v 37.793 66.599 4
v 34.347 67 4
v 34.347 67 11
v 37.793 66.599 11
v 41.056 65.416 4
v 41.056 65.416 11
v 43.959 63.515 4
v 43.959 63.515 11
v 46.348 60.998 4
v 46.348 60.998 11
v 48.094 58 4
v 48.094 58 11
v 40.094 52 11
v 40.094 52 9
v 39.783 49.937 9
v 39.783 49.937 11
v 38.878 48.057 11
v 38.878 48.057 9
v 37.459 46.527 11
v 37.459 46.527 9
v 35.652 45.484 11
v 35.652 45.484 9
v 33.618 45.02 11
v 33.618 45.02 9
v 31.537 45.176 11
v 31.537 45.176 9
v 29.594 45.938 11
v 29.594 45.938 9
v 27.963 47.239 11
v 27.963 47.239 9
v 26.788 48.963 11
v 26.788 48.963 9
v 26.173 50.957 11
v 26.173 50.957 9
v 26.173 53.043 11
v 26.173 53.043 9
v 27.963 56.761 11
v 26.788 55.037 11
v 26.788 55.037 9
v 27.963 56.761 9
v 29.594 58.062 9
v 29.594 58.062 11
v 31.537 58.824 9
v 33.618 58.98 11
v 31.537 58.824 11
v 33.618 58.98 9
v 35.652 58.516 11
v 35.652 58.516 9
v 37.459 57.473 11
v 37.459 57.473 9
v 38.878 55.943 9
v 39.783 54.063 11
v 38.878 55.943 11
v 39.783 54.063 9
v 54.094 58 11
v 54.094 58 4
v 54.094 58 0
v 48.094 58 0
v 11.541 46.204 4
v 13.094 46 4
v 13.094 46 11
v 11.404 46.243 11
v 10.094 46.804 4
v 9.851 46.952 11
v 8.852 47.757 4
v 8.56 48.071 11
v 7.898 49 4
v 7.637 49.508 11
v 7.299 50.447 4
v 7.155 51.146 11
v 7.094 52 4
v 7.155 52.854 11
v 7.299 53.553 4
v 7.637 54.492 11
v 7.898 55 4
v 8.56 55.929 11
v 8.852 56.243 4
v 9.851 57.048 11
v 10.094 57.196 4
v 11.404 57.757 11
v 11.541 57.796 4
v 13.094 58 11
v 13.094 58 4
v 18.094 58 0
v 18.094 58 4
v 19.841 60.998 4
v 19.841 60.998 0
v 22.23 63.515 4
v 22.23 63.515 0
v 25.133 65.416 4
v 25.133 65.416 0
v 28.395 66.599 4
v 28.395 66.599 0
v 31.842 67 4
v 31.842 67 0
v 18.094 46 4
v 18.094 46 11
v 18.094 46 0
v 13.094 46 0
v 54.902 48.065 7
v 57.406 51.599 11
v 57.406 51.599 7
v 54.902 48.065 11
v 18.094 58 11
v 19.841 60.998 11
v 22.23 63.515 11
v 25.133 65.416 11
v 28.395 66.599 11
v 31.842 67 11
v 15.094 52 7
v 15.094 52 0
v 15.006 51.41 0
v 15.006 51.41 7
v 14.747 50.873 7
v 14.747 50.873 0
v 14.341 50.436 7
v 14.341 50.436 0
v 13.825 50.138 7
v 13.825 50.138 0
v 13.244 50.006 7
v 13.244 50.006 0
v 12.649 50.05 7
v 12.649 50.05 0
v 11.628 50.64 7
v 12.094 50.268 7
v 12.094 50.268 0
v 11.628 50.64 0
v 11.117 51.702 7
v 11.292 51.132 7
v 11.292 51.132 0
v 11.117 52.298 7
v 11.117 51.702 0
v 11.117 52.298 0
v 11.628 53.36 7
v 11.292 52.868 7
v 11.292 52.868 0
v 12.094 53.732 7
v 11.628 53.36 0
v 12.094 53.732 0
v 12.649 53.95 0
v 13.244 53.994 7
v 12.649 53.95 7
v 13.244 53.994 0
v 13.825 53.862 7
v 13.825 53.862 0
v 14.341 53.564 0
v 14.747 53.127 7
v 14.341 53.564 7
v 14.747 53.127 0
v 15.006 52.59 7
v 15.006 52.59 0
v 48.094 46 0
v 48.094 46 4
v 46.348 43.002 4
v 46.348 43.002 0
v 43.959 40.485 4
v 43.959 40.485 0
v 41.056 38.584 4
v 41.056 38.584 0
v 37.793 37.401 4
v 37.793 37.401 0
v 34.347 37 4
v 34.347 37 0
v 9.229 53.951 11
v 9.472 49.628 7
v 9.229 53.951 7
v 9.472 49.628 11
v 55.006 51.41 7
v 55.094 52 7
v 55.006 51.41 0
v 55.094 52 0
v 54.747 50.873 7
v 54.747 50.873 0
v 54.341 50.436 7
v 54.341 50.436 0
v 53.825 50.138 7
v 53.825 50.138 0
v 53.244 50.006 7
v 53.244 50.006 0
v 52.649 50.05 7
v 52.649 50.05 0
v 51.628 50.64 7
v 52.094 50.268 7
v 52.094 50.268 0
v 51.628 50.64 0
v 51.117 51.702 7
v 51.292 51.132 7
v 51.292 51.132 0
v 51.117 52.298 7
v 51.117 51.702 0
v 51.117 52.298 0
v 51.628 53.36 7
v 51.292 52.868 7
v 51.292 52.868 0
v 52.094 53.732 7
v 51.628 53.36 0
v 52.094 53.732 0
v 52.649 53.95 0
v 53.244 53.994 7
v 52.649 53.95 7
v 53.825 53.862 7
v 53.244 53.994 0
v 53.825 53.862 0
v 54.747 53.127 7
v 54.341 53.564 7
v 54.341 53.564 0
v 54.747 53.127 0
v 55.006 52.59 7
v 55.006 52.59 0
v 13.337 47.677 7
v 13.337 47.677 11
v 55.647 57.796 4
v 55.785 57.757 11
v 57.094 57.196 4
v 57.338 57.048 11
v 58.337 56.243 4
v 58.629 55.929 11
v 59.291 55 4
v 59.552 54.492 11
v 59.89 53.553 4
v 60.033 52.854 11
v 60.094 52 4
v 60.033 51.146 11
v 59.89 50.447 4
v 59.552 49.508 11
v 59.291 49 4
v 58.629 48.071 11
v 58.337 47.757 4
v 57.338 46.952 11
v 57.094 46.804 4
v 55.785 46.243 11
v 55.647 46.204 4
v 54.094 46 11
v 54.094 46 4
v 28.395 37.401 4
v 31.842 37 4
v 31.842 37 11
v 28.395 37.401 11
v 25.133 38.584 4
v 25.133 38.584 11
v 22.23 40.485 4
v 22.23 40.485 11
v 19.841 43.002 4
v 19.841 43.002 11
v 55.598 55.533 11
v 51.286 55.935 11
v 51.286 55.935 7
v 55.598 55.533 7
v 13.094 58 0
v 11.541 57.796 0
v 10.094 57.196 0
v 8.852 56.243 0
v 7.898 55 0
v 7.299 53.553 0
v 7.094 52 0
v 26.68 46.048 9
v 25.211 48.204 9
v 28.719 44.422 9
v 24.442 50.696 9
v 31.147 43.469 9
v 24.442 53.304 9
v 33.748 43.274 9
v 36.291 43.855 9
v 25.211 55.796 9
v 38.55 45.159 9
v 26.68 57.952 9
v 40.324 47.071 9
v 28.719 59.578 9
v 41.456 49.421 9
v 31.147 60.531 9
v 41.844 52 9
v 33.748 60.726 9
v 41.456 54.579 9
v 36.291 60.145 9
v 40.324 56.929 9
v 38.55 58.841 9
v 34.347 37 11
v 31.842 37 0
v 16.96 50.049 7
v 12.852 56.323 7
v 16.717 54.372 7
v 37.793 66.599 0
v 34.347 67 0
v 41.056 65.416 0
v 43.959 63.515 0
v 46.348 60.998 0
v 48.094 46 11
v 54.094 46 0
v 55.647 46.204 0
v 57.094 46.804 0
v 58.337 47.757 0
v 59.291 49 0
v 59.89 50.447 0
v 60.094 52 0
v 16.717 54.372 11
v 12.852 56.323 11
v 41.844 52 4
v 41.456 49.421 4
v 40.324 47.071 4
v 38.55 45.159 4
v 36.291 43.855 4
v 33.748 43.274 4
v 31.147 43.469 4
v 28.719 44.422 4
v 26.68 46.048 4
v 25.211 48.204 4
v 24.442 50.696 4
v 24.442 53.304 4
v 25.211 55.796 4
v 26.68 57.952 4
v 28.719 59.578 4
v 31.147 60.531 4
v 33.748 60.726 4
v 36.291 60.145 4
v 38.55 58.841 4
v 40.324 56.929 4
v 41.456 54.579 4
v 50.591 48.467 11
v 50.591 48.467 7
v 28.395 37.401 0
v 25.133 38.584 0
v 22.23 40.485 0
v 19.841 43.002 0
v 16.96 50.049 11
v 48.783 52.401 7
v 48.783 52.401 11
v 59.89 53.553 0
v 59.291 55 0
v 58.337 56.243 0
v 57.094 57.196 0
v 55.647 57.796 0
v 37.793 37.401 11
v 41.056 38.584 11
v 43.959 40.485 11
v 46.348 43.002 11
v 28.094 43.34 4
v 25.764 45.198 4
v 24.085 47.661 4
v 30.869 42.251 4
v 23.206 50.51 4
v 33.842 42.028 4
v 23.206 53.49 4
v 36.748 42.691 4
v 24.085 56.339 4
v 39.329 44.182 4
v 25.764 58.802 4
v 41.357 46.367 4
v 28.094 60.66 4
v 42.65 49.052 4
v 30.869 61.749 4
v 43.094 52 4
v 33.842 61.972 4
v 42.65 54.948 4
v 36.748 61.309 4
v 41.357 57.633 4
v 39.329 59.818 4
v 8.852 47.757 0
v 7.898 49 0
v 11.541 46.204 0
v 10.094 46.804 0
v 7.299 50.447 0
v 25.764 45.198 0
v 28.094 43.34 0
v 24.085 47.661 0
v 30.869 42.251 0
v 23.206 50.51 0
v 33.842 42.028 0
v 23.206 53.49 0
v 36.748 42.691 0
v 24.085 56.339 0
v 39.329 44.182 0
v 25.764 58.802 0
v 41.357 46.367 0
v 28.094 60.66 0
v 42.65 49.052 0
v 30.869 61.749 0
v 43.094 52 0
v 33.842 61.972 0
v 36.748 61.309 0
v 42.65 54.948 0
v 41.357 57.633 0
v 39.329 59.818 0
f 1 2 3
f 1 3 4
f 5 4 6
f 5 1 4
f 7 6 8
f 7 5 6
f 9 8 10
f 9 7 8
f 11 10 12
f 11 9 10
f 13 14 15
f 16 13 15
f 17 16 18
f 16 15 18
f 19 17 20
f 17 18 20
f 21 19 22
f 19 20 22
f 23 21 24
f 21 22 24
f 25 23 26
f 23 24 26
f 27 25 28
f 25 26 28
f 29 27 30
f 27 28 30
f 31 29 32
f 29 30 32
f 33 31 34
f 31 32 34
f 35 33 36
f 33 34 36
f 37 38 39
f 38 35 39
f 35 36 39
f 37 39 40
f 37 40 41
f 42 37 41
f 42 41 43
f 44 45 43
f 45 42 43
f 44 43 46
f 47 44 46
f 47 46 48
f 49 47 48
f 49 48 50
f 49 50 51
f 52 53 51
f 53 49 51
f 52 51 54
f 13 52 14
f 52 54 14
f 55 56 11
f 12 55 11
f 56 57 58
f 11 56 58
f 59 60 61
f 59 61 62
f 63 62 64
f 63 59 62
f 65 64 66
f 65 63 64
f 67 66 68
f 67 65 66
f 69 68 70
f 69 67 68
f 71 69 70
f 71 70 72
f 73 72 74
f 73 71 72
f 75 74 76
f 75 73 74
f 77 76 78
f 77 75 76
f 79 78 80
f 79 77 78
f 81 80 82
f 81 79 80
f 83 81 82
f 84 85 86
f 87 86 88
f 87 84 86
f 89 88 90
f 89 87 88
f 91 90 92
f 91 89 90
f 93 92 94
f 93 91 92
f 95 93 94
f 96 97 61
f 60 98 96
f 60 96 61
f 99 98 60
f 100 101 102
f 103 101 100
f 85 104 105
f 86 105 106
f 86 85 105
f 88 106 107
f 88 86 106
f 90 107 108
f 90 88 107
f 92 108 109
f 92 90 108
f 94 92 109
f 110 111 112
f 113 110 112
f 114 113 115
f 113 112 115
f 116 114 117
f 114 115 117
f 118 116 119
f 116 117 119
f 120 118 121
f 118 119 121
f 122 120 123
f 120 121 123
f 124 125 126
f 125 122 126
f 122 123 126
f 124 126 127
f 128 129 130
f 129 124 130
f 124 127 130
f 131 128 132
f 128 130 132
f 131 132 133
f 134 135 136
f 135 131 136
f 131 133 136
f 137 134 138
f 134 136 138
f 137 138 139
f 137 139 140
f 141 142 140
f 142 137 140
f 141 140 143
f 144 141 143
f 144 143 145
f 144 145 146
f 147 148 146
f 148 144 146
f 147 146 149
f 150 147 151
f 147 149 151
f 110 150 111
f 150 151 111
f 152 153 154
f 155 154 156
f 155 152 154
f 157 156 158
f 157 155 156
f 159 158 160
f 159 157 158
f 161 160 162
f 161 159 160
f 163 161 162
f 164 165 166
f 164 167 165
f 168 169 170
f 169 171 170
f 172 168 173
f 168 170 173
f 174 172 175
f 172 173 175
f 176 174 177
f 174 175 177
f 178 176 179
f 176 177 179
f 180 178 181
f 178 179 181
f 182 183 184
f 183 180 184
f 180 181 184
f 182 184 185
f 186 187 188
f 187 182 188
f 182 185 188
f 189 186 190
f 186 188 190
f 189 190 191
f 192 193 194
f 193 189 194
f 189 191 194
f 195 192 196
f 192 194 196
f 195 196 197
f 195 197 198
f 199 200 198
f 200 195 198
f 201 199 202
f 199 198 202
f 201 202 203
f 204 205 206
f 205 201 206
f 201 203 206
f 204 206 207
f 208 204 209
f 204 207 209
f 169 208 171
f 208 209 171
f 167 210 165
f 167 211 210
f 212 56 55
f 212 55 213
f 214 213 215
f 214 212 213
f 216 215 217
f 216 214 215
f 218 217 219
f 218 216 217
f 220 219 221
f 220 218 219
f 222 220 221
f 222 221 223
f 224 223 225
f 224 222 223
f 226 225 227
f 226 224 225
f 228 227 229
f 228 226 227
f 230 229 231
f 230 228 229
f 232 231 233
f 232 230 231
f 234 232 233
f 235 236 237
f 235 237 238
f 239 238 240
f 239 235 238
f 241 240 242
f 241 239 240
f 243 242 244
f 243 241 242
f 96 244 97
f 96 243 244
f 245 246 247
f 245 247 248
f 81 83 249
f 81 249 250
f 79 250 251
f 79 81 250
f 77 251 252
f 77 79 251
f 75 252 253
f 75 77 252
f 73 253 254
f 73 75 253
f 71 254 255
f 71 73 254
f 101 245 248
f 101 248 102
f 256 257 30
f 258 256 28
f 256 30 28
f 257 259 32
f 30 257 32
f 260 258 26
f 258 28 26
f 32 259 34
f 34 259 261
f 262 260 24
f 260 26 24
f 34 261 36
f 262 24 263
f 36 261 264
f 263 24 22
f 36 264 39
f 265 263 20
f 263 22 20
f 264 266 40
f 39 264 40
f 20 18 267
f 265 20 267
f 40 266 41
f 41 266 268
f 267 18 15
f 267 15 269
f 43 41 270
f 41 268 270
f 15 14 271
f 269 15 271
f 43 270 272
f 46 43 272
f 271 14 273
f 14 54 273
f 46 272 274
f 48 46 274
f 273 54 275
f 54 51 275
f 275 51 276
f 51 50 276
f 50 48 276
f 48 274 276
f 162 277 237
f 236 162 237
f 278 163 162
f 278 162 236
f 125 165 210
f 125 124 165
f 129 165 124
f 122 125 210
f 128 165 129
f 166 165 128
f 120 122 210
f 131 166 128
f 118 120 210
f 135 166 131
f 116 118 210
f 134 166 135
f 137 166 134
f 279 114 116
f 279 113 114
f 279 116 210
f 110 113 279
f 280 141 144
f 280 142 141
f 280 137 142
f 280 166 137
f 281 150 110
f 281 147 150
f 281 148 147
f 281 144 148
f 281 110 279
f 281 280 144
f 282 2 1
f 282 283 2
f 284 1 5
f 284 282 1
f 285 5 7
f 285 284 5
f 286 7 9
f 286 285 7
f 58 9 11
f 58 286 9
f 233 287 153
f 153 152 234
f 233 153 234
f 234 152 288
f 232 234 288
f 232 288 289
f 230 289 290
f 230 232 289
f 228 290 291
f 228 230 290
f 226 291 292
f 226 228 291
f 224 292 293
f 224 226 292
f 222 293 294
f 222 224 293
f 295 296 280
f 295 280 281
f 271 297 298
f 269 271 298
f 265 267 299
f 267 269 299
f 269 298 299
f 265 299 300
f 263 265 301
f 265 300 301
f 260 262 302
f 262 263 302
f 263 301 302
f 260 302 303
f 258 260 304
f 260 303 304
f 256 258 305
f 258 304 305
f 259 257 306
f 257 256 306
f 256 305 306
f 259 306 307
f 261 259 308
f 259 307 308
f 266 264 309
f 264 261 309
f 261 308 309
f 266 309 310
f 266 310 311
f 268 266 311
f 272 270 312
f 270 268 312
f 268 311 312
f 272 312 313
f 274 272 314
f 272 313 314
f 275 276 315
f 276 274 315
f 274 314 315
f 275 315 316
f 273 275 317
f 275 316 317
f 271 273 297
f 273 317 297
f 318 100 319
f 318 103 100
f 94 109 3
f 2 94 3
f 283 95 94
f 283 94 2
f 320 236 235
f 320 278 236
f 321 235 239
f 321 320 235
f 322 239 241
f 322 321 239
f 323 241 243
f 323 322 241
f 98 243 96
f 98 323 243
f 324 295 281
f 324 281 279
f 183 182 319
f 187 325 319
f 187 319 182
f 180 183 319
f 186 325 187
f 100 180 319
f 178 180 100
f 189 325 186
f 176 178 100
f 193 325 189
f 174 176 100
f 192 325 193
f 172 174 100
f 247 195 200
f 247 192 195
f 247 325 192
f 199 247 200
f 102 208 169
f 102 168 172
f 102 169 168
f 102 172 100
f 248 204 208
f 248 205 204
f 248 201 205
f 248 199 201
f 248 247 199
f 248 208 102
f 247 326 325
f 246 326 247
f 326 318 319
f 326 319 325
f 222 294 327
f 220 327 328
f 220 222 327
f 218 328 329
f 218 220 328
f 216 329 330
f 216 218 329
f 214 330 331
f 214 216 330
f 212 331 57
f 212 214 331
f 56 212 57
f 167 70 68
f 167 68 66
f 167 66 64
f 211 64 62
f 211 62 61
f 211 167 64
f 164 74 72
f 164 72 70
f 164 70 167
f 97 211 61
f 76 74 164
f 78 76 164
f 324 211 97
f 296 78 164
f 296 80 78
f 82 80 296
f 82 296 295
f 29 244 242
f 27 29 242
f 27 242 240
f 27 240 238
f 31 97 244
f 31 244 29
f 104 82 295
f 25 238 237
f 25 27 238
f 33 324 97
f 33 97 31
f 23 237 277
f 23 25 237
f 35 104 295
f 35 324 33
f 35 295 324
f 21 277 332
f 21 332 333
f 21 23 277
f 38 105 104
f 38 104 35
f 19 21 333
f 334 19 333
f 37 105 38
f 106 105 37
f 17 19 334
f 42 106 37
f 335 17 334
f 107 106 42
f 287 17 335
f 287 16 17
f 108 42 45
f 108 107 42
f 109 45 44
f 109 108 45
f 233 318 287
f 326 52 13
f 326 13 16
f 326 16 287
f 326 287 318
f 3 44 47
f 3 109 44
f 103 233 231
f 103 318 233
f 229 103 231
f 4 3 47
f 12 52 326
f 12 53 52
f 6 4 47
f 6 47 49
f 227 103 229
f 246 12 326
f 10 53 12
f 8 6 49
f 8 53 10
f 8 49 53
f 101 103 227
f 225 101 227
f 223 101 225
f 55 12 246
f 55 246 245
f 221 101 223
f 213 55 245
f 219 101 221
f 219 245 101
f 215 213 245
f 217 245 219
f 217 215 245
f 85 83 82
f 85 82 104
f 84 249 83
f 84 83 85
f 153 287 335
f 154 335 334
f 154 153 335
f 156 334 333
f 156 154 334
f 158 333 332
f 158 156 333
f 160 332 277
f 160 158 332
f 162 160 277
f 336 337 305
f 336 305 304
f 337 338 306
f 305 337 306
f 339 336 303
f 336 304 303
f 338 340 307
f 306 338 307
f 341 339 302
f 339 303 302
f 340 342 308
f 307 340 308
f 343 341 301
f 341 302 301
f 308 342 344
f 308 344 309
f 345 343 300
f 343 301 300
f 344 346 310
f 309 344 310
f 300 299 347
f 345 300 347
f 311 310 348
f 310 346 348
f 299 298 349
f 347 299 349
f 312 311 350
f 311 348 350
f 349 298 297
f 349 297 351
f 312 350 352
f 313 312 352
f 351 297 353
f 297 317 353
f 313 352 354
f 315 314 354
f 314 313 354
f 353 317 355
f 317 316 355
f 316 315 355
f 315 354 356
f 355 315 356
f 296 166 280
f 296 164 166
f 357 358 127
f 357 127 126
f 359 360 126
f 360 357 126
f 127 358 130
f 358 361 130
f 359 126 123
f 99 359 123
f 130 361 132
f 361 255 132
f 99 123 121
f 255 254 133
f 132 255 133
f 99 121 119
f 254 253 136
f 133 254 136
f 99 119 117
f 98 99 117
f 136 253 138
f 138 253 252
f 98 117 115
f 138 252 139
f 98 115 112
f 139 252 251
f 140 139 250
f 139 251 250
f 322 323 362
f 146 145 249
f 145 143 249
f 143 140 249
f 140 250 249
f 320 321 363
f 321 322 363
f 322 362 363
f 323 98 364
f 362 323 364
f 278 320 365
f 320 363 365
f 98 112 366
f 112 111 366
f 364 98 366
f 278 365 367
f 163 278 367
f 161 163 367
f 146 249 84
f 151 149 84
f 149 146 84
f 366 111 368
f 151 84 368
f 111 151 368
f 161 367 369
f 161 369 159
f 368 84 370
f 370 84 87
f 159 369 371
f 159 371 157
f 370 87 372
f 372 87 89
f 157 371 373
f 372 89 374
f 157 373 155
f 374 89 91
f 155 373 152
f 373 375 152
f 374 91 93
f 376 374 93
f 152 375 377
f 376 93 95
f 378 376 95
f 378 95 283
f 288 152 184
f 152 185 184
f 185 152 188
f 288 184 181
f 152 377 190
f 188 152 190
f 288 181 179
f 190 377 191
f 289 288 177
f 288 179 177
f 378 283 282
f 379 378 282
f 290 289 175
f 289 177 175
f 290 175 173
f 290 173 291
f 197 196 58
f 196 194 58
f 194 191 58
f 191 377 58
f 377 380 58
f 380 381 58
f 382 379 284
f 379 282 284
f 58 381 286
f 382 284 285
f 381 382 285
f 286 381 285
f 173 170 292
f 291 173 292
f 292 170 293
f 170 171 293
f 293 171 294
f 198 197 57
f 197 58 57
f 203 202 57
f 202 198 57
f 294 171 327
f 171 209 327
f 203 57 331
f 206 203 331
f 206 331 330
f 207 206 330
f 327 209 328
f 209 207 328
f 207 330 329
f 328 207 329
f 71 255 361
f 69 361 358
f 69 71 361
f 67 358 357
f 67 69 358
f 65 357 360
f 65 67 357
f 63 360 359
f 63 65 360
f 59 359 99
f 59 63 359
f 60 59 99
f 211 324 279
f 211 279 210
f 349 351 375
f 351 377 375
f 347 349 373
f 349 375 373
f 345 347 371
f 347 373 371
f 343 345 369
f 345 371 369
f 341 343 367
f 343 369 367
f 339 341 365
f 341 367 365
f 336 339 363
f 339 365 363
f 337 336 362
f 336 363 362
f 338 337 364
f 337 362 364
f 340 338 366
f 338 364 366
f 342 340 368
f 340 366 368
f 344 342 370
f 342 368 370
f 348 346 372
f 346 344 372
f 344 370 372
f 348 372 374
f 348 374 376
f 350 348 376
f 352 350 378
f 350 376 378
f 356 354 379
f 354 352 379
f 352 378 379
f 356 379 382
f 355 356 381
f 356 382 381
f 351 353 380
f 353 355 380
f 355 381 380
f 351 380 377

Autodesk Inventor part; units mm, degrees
ref_plane "YZ Plane" through (0, 0, 0) normal (1, 0, 0) x (0, 1, 0)
ref_plane "XZ Plane" through (0, 0, 0) normal (0, 1, 0) x (-1, 0, 0)
ref_plane "XY Plane" through (0, 0, 0) normal (0, 0, 1) x (1, 0, 0)
sketch "Эскиз1" plane through (0, 0, 0) normal (0, 0, 1) x (1, 0, 0)
  circle A0 centre (33.0944, 52) radius 10 projected
  circle A1 centre (53.0944, 52) radius 2 projected
  circle A2 centre (13.0944, 52) radius 2 projected
  line L0 (48.0944, 37) -> (18.0944, 37)
  line L1 (18.0944, 37) -> (18.0944, 67)
  line L2 (18.0944, 67) -> (48.0944, 67)
  line L3 (48.0944, 67) -> (48.0944, 37)
  line L4 (18.0944, 46) -> (7.0944, 46)
  line L5 (7.0944, 46) -> (7.0944, 58)
  line L6 (7.0944, 58) -> (18.0944, 58)
  line L7 (18.0944, 58) -> (18.0944, 46)
  line L8 (48.0944, 46) -> (60.0944, 46)
  line L9 (60.0944, 46) -> (60.0944, 58)
  line L10 (60.0944, 58) -> (48.0944, 58)
  line L11 (48.0944, 58) -> (48.0944, 46)
  point P0 (0, 0)
  dimension "d0" = 15
  dimension "d1" = 15
  dimension "d2" = 15
  dimension "d3" = 15
  dimension "d4" = 6
  dimension "d5" = 6
  dimension "d6" = 6
  dimension "d7" = 12
  dimension "d8" = 12
extrude "Выдавливание1" add sketch "Эскиз1" along normal blind 4
fillet "Сопряжение1" radius 15 4 edges at (18.0944, 37, 2) (18.0944, 67, 2) (48.0944, 37, 2) (48.0944, 67, 2)
fillet "Сопряжение2" radius 6 4 edges at (60.0944, 58, 2) (60.0944, 46, 2) (7.0944, 46, 2) (7.0944, 58, 2)
sketch "Эскиз2" plane through (0, 0, 4) normal (0, 0, 1) x (1, 0, 0)
  circle A0 centre (33.0944, 52) radius 10 projected
  circle A1 centre (33.0944, 52) radius 8.75
  circle A2 centre (33.0944, 52) radius 10 projected
  circle A3 centre (53.0944, 52) radius 2 projected
  circle A4 centre (13.0944, 52) radius 2 projected
  arc A5 (13.0944, 58) -> (13.0944, 46) centre (13.0944, 52) ccw projected
  line L0 (13.0944, 46) -> (18.0944, 46) projected
  arc A6 (18.0944, 46) -> (31.8421, 37) centre (31.8421, 52) ccw projected
  line L1 (31.8421, 37) -> (34.3467, 37) projected
  arc A7 (34.3467, 37) -> (48.0944, 46) centre (34.3467, 52) ccw projected
  line L2 (48.0944, 46) -> (54.0944, 46) projected
  arc A8 (54.0944, 46) -> (54.0944, 58) centre (54.0944, 52) ccw projected
  line L3 (54.0944, 58) -> (48.0944, 58) projected
  arc A9 (48.0944, 58) -> (34.3467, 67) centre (34.3467, 52) ccw projected
  line L4 (34.3467, 67) -> (31.8421, 67) projected
  arc A10 (31.8421, 67) -> (18.0944, 58) centre (31.8421, 52) ccw projected
  line L5 (18.0944, 58) -> (13.0944, 58) projected
  point P0 (0, 0)
  dimension "d13" = 17.5
extrude "Выдавливание2" add sketch "Эскиз2" along normal blind 5 contours A0 | L5 A10 L4 A9 L3 A8 L2 A7 L1 A6 L0 A5
sketch "Эскиз3" plane through (0, 0, 9) normal (0, 0, 1) x (1, 0, 0)
  circle A0 centre (33.0944, 52) radius 8.75 projected
  circle A1 centre (13.0944, 52) radius 2 projected
  circle A2 centre (53.0944, 52) radius 2 projected
  arc A3 (13.0944, 58) -> (13.0944, 46) centre (13.0944, 52) ccw projected
  line L0 (13.0944, 46) -> (18.0944, 46) projected
  arc A4 (18.0944, 46) -> (31.8421, 37) centre (31.8421, 52) ccw projected
  line L1 (31.8421, 37) -> (34.3467, 37) projected
  arc A5 (34.3467, 37) -> (48.0944, 46) centre (34.3467, 52) ccw projected
  line L2 (48.0944, 46) -> (54.0944, 46) projected
  arc A6 (54.0944, 46) -> (54.0944, 58) centre (54.0944, 52) ccw projected
  line L3 (54.0944, 58) -> (48.0944, 58) projected
  arc A7 (48.0944, 58) -> (34.3467, 67) centre (34.3467, 52) ccw projected
  line L4 (34.3467, 67) -> (31.8421, 67) projected
  arc A8 (31.8421, 67) -> (18.0944, 58) centre (31.8421, 52) ccw projected
  line L5 (18.0944, 58) -> (13.0944, 58) projected
  circle A9 centre (33.0944, 52) radius 7
  point P0 (0, 0)
  dimension "d16" = 14
extrude "Выдавливание3" add sketch "Эскиз3" along normal blind 2 contours A0 | L5 A8 L4 A7 L3 A6 L2 A5 L1 A4 L0 A3
sketch "Эскиз4" plane through (0, 0, 11) normal (0, 0, 1) x (1, 0, 0)
  circle A0 centre (13.0944, 52) radius 2 projected
  circle A1 centre (53.0944, 52) radius 2 projected
  line L0 (9.4717, 49.6281) -> (9.2289, 53.9514)
  line L1 (9.2289, 53.9514) -> (12.8516, 56.3233)
  line L2 (12.8516, 56.3233) -> (16.7171, 54.3719)
  line L3 (16.7171, 54.3719) -> (16.9599, 50.0486)
  line L4 (16.9599, 50.0486) -> (13.3372, 47.6767)
  line L5 (13.3372, 47.6767) -> (9.4717, 49.6281)
  line L6 (50.591, 48.4669) -> (48.7829, 52.4014)
  line L7 (48.7829, 52.4014) -> (51.2863, 55.9346)
  line L8 (51.2863, 55.9346) -> (55.5978, 55.5331)
  line L9 (55.5978, 55.5331) -> (57.4059, 51.5986)
  line L10 (57.4059, 51.5986) -> (54.9025, 48.0654)
  line L11 (54.9025, 48.0654) -> (50.591, 48.4669)
  point P0 (0, 0)
  dimension "d19" = 7.5
  dimension "d20" = 7.5
extrude "Выдавливание4" cut sketch "Эскиз4" against normal blind 4
equation "\"d20\" = d19"
properties part number "ппрофиль"
